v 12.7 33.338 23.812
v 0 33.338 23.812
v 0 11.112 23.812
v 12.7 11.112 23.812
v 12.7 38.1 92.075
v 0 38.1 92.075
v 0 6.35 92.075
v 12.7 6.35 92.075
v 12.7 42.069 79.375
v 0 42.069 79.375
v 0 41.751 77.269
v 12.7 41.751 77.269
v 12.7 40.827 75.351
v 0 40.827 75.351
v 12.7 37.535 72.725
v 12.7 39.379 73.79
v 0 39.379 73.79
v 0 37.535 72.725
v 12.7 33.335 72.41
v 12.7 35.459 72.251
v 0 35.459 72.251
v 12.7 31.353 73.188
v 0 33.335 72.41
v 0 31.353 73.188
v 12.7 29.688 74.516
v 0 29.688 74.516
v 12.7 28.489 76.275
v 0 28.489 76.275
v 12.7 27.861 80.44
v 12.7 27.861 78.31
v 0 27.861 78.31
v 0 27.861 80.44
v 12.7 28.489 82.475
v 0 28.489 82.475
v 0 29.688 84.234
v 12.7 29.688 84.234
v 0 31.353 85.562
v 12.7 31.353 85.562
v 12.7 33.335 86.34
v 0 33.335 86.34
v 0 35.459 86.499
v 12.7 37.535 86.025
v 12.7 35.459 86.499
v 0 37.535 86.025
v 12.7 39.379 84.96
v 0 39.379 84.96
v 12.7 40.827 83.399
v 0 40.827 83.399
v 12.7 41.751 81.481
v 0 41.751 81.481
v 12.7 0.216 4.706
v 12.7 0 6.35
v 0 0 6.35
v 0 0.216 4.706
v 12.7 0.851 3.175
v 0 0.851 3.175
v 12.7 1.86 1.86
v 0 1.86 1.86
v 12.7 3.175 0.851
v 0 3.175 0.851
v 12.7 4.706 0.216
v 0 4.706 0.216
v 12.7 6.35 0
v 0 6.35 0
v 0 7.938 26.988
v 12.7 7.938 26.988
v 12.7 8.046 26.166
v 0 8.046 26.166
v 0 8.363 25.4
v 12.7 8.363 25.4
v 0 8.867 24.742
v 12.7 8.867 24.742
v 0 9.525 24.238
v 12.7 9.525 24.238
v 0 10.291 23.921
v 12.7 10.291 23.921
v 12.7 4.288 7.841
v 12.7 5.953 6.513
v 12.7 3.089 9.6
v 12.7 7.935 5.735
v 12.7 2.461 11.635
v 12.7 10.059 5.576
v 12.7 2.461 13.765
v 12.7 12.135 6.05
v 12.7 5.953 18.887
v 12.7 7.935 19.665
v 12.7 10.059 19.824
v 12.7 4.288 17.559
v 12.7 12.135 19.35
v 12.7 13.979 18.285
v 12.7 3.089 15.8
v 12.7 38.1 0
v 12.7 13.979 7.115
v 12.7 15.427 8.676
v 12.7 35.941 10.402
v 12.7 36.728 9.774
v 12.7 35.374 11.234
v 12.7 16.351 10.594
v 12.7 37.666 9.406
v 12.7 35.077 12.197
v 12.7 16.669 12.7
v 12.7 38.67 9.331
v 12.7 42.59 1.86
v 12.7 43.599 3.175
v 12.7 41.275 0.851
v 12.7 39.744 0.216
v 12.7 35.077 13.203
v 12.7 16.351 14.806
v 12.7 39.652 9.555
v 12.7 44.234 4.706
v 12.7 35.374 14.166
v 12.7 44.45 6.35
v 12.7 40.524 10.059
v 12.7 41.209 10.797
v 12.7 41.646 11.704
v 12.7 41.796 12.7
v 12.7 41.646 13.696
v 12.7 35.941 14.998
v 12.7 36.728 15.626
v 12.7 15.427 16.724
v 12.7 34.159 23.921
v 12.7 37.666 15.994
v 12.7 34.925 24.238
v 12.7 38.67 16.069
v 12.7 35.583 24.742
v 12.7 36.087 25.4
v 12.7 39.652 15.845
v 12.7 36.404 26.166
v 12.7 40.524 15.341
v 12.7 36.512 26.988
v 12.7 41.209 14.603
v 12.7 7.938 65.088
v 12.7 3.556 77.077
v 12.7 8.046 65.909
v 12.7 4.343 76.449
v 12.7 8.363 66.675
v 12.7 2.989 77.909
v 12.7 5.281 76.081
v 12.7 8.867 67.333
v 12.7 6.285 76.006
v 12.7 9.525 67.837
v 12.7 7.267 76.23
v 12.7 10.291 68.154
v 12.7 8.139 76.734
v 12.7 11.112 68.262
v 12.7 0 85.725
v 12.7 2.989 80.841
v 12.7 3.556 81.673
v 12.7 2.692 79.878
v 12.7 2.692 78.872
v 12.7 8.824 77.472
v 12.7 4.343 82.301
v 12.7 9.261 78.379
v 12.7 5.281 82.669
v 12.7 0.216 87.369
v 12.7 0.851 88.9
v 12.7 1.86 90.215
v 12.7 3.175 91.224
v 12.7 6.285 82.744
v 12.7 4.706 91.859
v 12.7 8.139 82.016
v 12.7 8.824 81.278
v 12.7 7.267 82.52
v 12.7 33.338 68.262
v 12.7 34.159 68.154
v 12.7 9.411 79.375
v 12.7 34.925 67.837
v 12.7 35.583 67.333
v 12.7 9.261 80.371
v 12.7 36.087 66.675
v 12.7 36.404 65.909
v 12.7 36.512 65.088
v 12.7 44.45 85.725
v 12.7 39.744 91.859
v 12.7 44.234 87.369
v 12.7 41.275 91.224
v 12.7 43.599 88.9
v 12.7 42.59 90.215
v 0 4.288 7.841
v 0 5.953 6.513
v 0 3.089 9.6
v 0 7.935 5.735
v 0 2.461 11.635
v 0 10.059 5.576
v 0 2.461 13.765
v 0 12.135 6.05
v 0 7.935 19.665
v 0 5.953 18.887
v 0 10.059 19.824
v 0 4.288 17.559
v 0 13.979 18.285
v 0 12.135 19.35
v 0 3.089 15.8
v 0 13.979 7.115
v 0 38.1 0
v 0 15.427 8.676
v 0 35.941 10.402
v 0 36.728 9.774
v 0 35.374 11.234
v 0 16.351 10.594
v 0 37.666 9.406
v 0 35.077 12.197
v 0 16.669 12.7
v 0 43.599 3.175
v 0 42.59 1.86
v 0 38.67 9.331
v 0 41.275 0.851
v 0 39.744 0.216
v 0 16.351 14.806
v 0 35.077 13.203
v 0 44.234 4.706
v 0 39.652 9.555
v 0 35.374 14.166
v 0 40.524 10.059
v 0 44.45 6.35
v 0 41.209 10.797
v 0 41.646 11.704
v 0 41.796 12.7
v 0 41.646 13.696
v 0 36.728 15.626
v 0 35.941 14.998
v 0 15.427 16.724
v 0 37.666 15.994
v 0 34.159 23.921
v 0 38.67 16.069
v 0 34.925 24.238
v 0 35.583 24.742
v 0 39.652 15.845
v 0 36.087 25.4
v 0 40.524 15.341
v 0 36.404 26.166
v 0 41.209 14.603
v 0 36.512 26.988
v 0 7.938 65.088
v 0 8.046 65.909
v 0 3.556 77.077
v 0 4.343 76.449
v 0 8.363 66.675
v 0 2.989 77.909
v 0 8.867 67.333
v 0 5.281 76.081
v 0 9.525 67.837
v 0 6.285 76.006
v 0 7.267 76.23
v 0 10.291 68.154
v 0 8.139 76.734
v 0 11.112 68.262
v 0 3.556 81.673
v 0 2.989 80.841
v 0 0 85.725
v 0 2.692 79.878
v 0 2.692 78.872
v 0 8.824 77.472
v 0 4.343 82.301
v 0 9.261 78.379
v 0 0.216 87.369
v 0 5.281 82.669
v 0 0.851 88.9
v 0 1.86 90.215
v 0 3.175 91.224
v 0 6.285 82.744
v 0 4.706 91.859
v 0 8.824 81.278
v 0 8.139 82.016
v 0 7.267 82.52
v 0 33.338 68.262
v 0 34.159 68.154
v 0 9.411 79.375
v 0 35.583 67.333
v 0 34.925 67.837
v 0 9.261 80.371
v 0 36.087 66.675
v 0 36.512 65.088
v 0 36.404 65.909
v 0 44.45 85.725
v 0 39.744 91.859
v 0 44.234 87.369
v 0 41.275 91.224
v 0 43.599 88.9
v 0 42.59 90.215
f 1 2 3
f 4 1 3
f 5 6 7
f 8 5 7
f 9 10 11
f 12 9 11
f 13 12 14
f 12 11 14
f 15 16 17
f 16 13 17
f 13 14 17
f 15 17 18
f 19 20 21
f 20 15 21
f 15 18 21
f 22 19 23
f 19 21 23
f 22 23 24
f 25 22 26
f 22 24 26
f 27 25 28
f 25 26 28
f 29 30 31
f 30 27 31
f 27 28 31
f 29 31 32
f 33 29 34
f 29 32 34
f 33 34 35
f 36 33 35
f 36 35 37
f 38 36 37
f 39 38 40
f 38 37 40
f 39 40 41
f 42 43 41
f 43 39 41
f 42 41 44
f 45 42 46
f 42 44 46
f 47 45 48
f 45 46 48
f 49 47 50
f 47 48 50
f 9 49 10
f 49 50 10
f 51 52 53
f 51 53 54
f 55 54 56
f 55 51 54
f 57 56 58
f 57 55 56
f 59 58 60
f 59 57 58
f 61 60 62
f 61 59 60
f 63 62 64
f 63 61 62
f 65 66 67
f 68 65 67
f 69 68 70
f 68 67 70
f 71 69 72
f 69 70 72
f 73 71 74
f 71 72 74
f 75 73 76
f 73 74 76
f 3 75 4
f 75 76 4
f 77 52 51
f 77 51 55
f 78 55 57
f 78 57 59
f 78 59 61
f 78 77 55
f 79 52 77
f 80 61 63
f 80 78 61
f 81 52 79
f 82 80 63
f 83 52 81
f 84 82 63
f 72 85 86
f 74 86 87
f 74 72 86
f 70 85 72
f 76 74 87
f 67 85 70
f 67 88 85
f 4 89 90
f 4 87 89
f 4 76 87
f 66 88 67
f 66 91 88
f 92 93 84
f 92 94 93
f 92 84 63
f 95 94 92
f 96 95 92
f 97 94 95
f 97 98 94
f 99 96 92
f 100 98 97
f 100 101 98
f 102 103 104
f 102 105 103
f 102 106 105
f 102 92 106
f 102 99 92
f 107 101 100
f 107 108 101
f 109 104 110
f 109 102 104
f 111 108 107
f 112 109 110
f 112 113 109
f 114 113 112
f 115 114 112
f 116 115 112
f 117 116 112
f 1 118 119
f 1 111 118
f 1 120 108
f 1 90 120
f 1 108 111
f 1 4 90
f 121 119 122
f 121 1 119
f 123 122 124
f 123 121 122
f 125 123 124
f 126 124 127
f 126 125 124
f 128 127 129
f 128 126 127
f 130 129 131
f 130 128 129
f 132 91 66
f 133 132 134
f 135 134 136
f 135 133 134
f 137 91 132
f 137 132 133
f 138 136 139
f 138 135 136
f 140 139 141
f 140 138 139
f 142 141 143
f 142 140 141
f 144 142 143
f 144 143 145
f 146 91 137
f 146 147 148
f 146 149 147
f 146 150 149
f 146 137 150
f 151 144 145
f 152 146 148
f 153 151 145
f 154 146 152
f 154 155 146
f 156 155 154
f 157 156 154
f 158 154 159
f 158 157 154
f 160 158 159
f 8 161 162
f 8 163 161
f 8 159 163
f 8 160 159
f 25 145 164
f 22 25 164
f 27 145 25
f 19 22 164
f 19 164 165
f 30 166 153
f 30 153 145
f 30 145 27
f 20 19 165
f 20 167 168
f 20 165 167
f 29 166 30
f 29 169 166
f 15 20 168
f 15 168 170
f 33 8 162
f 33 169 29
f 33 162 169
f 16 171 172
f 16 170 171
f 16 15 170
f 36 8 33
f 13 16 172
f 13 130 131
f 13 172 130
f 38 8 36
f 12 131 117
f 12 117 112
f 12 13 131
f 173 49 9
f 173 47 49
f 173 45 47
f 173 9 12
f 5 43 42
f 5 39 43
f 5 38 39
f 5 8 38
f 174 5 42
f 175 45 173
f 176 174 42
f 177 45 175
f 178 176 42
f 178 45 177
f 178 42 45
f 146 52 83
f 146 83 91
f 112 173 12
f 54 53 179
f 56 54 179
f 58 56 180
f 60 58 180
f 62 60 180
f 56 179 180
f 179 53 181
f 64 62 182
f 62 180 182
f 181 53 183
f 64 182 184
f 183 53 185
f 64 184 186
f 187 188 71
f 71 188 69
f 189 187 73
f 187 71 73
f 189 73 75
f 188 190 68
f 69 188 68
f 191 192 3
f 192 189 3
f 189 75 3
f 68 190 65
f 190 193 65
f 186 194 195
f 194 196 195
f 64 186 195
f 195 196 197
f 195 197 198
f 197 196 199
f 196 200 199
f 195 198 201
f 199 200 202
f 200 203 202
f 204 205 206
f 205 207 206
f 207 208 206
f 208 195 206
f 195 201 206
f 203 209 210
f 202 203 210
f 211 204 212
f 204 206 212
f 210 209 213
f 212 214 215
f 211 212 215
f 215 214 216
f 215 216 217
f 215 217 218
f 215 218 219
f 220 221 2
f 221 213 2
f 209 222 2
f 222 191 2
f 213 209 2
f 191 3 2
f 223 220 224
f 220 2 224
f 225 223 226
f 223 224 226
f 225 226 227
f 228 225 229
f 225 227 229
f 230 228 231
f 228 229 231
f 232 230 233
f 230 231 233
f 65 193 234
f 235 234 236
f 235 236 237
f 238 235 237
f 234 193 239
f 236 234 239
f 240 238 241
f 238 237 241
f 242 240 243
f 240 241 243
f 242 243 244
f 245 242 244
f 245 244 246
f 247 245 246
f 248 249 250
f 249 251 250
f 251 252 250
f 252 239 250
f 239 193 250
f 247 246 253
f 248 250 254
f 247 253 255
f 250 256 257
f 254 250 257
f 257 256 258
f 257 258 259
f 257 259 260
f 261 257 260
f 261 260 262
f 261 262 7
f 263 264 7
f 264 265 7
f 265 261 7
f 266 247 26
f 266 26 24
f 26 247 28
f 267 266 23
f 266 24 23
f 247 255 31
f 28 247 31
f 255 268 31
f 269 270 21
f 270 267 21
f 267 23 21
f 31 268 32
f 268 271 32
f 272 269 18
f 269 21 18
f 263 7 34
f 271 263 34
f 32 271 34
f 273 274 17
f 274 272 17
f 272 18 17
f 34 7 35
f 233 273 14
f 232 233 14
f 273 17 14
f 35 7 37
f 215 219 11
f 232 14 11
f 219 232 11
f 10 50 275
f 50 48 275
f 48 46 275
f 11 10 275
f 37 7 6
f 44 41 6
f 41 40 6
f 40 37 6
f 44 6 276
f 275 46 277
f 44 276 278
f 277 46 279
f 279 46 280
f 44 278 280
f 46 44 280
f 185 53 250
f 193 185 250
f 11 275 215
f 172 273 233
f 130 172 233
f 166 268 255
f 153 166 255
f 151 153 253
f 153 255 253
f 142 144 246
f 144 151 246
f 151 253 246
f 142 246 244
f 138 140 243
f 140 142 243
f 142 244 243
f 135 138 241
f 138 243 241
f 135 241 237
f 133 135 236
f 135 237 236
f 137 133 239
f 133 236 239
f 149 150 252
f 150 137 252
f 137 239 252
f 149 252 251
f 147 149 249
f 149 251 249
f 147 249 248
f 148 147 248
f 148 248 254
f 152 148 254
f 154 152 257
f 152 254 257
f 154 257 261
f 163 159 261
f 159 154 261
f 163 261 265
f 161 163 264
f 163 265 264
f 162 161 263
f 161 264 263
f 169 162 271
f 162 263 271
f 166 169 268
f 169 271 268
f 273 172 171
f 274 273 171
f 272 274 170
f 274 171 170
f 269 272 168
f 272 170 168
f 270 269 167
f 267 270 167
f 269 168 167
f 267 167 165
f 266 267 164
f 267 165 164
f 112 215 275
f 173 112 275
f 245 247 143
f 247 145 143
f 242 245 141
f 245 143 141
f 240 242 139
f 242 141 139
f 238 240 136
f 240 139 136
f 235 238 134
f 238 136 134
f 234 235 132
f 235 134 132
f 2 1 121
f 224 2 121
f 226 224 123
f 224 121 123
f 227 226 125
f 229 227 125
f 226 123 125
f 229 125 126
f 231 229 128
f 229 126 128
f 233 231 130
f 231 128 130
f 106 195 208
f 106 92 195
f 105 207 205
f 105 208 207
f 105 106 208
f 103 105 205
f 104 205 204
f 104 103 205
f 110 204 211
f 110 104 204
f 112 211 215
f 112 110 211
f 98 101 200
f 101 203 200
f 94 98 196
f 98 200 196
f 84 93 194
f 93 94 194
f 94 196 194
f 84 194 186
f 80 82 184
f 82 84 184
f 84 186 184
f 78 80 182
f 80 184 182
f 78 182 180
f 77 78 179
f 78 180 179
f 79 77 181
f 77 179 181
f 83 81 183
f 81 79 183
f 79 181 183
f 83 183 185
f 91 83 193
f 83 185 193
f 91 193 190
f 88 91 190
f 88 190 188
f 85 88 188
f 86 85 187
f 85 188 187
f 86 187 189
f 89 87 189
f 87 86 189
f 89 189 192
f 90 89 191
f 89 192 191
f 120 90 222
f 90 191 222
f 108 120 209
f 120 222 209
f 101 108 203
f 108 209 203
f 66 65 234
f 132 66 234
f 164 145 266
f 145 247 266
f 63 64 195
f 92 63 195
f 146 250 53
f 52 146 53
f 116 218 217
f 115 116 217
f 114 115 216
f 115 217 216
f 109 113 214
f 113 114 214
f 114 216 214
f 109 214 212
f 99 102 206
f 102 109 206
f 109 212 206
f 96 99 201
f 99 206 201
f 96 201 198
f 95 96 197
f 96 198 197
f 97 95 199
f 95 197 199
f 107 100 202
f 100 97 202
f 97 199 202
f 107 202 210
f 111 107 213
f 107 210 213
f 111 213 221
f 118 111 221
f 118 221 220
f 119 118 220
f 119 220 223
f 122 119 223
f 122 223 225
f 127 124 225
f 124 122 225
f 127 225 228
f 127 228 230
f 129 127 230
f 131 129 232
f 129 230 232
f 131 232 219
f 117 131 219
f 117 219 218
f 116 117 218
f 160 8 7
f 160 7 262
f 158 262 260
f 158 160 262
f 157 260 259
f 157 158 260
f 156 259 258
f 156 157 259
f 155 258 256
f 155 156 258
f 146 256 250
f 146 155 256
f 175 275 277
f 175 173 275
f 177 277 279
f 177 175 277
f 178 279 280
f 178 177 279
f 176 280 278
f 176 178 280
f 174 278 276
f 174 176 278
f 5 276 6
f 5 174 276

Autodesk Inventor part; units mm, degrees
ref_plane "YZ Plane" through (0, 0, 0) normal (1, 0, 0) x (0, 1, 0)
ref_plane "XZ Plane" through (0, 0, 0) normal (0, 1, 0) x (-1, 0, 0)
ref_plane "XY Plane" through (0, 0, 0) normal (0, 0, 1) x (1, 0, 0)
sketch "Sketch1" plane through (0, 0, 0) normal (1, 0, 0) x (0, 1, 0)
  line L0 (0, 0) -> (44.45, 0)
  line L1 (44.45, 0) -> (44.45, 92.075)
  line L2 (44.45, 92.075) -> (0, 92.075)
  line L3 (0, 92.075) -> (0, 0)
  line L4 (14.2875, 92.075) -> (14.2875, 0) construction
  line L5 (30.1625, 92.075) -> (30.1625, 0) construction
  line L6 (22.225, 92.075) -> (22.225, 0) construction
  circle A0 centre (34.925, 79.375) radius 4.7625 construction
  circle A1 centre (9.525, 12.7) radius 4.7625 construction
  circle A2 centre (34.925, 79.375) radius 7.1437
  circle A3 centre (9.525, 12.7) radius 7.1437
  line L7 (7.9375, 68.2625) -> (36.5125, 68.2625)
  line L8 (36.5125, 68.2625) -> (36.5125, 23.8125)
  line L9 (36.5125, 23.8125) -> (7.9375, 23.8125)
  line L10 (7.9375, 23.8125) -> (7.9375, 68.2625)
  line L11 (7.9375, 46.0375) -> (36.5125, 46.0375) construction
  circle A4 centre (6.0325, 79.375) radius 3.3782
  circle A5 centre (38.4175, 12.7) radius 3.3782
  point P0 (22.225, 68.2625)
  point P1 (22.225, 46.0375)
  dimension "d0" = 15.875
  dimension "d2" = 7.9375
  dimension "d3" = 44.45
  dimension "d4" = 9.525
  dimension "d5" = 9.525
  dimension "d6" = 92.075
  dimension "d7" = 12.7
  dimension "d8" = 12.7
  dimension "d11" = 14.2875
  dimension "d12" = 14.2875
  dimension "d15" = 28.575
  dimension "d16" = 44.45
  dimension "d19" = 6.7564
  dimension "d20" = 6.7564
  dimension "d21" = 8.255
  dimension "d22" = 12.7
  dimension "d23" = 8.255
  dimension "d24" = 12.7
extrude "Extrusion1" add sketch "Sketch1" along normal blind 12.7
fillet "Fillet1" radius 6.35 4 edges at (6.35, 0, 92.075) (6.35, 44.45, 92.075) (6.35, 0, 0) (6.35, 44.45, 0)
fillet "Fillet1" radius 3.175 4 edges at (6.35, 7.9375, 68.2625) (6.35, 36.5125, 68.2625) (6.35, 36.5125, 23.8125) (6.35, 7.9375, 23.8125)
equation "\"d2\" = 0.5 * d0"
equation "\"d23\" = d21"
properties part number "M - Carriage Plate Part 1" material "Aluminum 6061"
